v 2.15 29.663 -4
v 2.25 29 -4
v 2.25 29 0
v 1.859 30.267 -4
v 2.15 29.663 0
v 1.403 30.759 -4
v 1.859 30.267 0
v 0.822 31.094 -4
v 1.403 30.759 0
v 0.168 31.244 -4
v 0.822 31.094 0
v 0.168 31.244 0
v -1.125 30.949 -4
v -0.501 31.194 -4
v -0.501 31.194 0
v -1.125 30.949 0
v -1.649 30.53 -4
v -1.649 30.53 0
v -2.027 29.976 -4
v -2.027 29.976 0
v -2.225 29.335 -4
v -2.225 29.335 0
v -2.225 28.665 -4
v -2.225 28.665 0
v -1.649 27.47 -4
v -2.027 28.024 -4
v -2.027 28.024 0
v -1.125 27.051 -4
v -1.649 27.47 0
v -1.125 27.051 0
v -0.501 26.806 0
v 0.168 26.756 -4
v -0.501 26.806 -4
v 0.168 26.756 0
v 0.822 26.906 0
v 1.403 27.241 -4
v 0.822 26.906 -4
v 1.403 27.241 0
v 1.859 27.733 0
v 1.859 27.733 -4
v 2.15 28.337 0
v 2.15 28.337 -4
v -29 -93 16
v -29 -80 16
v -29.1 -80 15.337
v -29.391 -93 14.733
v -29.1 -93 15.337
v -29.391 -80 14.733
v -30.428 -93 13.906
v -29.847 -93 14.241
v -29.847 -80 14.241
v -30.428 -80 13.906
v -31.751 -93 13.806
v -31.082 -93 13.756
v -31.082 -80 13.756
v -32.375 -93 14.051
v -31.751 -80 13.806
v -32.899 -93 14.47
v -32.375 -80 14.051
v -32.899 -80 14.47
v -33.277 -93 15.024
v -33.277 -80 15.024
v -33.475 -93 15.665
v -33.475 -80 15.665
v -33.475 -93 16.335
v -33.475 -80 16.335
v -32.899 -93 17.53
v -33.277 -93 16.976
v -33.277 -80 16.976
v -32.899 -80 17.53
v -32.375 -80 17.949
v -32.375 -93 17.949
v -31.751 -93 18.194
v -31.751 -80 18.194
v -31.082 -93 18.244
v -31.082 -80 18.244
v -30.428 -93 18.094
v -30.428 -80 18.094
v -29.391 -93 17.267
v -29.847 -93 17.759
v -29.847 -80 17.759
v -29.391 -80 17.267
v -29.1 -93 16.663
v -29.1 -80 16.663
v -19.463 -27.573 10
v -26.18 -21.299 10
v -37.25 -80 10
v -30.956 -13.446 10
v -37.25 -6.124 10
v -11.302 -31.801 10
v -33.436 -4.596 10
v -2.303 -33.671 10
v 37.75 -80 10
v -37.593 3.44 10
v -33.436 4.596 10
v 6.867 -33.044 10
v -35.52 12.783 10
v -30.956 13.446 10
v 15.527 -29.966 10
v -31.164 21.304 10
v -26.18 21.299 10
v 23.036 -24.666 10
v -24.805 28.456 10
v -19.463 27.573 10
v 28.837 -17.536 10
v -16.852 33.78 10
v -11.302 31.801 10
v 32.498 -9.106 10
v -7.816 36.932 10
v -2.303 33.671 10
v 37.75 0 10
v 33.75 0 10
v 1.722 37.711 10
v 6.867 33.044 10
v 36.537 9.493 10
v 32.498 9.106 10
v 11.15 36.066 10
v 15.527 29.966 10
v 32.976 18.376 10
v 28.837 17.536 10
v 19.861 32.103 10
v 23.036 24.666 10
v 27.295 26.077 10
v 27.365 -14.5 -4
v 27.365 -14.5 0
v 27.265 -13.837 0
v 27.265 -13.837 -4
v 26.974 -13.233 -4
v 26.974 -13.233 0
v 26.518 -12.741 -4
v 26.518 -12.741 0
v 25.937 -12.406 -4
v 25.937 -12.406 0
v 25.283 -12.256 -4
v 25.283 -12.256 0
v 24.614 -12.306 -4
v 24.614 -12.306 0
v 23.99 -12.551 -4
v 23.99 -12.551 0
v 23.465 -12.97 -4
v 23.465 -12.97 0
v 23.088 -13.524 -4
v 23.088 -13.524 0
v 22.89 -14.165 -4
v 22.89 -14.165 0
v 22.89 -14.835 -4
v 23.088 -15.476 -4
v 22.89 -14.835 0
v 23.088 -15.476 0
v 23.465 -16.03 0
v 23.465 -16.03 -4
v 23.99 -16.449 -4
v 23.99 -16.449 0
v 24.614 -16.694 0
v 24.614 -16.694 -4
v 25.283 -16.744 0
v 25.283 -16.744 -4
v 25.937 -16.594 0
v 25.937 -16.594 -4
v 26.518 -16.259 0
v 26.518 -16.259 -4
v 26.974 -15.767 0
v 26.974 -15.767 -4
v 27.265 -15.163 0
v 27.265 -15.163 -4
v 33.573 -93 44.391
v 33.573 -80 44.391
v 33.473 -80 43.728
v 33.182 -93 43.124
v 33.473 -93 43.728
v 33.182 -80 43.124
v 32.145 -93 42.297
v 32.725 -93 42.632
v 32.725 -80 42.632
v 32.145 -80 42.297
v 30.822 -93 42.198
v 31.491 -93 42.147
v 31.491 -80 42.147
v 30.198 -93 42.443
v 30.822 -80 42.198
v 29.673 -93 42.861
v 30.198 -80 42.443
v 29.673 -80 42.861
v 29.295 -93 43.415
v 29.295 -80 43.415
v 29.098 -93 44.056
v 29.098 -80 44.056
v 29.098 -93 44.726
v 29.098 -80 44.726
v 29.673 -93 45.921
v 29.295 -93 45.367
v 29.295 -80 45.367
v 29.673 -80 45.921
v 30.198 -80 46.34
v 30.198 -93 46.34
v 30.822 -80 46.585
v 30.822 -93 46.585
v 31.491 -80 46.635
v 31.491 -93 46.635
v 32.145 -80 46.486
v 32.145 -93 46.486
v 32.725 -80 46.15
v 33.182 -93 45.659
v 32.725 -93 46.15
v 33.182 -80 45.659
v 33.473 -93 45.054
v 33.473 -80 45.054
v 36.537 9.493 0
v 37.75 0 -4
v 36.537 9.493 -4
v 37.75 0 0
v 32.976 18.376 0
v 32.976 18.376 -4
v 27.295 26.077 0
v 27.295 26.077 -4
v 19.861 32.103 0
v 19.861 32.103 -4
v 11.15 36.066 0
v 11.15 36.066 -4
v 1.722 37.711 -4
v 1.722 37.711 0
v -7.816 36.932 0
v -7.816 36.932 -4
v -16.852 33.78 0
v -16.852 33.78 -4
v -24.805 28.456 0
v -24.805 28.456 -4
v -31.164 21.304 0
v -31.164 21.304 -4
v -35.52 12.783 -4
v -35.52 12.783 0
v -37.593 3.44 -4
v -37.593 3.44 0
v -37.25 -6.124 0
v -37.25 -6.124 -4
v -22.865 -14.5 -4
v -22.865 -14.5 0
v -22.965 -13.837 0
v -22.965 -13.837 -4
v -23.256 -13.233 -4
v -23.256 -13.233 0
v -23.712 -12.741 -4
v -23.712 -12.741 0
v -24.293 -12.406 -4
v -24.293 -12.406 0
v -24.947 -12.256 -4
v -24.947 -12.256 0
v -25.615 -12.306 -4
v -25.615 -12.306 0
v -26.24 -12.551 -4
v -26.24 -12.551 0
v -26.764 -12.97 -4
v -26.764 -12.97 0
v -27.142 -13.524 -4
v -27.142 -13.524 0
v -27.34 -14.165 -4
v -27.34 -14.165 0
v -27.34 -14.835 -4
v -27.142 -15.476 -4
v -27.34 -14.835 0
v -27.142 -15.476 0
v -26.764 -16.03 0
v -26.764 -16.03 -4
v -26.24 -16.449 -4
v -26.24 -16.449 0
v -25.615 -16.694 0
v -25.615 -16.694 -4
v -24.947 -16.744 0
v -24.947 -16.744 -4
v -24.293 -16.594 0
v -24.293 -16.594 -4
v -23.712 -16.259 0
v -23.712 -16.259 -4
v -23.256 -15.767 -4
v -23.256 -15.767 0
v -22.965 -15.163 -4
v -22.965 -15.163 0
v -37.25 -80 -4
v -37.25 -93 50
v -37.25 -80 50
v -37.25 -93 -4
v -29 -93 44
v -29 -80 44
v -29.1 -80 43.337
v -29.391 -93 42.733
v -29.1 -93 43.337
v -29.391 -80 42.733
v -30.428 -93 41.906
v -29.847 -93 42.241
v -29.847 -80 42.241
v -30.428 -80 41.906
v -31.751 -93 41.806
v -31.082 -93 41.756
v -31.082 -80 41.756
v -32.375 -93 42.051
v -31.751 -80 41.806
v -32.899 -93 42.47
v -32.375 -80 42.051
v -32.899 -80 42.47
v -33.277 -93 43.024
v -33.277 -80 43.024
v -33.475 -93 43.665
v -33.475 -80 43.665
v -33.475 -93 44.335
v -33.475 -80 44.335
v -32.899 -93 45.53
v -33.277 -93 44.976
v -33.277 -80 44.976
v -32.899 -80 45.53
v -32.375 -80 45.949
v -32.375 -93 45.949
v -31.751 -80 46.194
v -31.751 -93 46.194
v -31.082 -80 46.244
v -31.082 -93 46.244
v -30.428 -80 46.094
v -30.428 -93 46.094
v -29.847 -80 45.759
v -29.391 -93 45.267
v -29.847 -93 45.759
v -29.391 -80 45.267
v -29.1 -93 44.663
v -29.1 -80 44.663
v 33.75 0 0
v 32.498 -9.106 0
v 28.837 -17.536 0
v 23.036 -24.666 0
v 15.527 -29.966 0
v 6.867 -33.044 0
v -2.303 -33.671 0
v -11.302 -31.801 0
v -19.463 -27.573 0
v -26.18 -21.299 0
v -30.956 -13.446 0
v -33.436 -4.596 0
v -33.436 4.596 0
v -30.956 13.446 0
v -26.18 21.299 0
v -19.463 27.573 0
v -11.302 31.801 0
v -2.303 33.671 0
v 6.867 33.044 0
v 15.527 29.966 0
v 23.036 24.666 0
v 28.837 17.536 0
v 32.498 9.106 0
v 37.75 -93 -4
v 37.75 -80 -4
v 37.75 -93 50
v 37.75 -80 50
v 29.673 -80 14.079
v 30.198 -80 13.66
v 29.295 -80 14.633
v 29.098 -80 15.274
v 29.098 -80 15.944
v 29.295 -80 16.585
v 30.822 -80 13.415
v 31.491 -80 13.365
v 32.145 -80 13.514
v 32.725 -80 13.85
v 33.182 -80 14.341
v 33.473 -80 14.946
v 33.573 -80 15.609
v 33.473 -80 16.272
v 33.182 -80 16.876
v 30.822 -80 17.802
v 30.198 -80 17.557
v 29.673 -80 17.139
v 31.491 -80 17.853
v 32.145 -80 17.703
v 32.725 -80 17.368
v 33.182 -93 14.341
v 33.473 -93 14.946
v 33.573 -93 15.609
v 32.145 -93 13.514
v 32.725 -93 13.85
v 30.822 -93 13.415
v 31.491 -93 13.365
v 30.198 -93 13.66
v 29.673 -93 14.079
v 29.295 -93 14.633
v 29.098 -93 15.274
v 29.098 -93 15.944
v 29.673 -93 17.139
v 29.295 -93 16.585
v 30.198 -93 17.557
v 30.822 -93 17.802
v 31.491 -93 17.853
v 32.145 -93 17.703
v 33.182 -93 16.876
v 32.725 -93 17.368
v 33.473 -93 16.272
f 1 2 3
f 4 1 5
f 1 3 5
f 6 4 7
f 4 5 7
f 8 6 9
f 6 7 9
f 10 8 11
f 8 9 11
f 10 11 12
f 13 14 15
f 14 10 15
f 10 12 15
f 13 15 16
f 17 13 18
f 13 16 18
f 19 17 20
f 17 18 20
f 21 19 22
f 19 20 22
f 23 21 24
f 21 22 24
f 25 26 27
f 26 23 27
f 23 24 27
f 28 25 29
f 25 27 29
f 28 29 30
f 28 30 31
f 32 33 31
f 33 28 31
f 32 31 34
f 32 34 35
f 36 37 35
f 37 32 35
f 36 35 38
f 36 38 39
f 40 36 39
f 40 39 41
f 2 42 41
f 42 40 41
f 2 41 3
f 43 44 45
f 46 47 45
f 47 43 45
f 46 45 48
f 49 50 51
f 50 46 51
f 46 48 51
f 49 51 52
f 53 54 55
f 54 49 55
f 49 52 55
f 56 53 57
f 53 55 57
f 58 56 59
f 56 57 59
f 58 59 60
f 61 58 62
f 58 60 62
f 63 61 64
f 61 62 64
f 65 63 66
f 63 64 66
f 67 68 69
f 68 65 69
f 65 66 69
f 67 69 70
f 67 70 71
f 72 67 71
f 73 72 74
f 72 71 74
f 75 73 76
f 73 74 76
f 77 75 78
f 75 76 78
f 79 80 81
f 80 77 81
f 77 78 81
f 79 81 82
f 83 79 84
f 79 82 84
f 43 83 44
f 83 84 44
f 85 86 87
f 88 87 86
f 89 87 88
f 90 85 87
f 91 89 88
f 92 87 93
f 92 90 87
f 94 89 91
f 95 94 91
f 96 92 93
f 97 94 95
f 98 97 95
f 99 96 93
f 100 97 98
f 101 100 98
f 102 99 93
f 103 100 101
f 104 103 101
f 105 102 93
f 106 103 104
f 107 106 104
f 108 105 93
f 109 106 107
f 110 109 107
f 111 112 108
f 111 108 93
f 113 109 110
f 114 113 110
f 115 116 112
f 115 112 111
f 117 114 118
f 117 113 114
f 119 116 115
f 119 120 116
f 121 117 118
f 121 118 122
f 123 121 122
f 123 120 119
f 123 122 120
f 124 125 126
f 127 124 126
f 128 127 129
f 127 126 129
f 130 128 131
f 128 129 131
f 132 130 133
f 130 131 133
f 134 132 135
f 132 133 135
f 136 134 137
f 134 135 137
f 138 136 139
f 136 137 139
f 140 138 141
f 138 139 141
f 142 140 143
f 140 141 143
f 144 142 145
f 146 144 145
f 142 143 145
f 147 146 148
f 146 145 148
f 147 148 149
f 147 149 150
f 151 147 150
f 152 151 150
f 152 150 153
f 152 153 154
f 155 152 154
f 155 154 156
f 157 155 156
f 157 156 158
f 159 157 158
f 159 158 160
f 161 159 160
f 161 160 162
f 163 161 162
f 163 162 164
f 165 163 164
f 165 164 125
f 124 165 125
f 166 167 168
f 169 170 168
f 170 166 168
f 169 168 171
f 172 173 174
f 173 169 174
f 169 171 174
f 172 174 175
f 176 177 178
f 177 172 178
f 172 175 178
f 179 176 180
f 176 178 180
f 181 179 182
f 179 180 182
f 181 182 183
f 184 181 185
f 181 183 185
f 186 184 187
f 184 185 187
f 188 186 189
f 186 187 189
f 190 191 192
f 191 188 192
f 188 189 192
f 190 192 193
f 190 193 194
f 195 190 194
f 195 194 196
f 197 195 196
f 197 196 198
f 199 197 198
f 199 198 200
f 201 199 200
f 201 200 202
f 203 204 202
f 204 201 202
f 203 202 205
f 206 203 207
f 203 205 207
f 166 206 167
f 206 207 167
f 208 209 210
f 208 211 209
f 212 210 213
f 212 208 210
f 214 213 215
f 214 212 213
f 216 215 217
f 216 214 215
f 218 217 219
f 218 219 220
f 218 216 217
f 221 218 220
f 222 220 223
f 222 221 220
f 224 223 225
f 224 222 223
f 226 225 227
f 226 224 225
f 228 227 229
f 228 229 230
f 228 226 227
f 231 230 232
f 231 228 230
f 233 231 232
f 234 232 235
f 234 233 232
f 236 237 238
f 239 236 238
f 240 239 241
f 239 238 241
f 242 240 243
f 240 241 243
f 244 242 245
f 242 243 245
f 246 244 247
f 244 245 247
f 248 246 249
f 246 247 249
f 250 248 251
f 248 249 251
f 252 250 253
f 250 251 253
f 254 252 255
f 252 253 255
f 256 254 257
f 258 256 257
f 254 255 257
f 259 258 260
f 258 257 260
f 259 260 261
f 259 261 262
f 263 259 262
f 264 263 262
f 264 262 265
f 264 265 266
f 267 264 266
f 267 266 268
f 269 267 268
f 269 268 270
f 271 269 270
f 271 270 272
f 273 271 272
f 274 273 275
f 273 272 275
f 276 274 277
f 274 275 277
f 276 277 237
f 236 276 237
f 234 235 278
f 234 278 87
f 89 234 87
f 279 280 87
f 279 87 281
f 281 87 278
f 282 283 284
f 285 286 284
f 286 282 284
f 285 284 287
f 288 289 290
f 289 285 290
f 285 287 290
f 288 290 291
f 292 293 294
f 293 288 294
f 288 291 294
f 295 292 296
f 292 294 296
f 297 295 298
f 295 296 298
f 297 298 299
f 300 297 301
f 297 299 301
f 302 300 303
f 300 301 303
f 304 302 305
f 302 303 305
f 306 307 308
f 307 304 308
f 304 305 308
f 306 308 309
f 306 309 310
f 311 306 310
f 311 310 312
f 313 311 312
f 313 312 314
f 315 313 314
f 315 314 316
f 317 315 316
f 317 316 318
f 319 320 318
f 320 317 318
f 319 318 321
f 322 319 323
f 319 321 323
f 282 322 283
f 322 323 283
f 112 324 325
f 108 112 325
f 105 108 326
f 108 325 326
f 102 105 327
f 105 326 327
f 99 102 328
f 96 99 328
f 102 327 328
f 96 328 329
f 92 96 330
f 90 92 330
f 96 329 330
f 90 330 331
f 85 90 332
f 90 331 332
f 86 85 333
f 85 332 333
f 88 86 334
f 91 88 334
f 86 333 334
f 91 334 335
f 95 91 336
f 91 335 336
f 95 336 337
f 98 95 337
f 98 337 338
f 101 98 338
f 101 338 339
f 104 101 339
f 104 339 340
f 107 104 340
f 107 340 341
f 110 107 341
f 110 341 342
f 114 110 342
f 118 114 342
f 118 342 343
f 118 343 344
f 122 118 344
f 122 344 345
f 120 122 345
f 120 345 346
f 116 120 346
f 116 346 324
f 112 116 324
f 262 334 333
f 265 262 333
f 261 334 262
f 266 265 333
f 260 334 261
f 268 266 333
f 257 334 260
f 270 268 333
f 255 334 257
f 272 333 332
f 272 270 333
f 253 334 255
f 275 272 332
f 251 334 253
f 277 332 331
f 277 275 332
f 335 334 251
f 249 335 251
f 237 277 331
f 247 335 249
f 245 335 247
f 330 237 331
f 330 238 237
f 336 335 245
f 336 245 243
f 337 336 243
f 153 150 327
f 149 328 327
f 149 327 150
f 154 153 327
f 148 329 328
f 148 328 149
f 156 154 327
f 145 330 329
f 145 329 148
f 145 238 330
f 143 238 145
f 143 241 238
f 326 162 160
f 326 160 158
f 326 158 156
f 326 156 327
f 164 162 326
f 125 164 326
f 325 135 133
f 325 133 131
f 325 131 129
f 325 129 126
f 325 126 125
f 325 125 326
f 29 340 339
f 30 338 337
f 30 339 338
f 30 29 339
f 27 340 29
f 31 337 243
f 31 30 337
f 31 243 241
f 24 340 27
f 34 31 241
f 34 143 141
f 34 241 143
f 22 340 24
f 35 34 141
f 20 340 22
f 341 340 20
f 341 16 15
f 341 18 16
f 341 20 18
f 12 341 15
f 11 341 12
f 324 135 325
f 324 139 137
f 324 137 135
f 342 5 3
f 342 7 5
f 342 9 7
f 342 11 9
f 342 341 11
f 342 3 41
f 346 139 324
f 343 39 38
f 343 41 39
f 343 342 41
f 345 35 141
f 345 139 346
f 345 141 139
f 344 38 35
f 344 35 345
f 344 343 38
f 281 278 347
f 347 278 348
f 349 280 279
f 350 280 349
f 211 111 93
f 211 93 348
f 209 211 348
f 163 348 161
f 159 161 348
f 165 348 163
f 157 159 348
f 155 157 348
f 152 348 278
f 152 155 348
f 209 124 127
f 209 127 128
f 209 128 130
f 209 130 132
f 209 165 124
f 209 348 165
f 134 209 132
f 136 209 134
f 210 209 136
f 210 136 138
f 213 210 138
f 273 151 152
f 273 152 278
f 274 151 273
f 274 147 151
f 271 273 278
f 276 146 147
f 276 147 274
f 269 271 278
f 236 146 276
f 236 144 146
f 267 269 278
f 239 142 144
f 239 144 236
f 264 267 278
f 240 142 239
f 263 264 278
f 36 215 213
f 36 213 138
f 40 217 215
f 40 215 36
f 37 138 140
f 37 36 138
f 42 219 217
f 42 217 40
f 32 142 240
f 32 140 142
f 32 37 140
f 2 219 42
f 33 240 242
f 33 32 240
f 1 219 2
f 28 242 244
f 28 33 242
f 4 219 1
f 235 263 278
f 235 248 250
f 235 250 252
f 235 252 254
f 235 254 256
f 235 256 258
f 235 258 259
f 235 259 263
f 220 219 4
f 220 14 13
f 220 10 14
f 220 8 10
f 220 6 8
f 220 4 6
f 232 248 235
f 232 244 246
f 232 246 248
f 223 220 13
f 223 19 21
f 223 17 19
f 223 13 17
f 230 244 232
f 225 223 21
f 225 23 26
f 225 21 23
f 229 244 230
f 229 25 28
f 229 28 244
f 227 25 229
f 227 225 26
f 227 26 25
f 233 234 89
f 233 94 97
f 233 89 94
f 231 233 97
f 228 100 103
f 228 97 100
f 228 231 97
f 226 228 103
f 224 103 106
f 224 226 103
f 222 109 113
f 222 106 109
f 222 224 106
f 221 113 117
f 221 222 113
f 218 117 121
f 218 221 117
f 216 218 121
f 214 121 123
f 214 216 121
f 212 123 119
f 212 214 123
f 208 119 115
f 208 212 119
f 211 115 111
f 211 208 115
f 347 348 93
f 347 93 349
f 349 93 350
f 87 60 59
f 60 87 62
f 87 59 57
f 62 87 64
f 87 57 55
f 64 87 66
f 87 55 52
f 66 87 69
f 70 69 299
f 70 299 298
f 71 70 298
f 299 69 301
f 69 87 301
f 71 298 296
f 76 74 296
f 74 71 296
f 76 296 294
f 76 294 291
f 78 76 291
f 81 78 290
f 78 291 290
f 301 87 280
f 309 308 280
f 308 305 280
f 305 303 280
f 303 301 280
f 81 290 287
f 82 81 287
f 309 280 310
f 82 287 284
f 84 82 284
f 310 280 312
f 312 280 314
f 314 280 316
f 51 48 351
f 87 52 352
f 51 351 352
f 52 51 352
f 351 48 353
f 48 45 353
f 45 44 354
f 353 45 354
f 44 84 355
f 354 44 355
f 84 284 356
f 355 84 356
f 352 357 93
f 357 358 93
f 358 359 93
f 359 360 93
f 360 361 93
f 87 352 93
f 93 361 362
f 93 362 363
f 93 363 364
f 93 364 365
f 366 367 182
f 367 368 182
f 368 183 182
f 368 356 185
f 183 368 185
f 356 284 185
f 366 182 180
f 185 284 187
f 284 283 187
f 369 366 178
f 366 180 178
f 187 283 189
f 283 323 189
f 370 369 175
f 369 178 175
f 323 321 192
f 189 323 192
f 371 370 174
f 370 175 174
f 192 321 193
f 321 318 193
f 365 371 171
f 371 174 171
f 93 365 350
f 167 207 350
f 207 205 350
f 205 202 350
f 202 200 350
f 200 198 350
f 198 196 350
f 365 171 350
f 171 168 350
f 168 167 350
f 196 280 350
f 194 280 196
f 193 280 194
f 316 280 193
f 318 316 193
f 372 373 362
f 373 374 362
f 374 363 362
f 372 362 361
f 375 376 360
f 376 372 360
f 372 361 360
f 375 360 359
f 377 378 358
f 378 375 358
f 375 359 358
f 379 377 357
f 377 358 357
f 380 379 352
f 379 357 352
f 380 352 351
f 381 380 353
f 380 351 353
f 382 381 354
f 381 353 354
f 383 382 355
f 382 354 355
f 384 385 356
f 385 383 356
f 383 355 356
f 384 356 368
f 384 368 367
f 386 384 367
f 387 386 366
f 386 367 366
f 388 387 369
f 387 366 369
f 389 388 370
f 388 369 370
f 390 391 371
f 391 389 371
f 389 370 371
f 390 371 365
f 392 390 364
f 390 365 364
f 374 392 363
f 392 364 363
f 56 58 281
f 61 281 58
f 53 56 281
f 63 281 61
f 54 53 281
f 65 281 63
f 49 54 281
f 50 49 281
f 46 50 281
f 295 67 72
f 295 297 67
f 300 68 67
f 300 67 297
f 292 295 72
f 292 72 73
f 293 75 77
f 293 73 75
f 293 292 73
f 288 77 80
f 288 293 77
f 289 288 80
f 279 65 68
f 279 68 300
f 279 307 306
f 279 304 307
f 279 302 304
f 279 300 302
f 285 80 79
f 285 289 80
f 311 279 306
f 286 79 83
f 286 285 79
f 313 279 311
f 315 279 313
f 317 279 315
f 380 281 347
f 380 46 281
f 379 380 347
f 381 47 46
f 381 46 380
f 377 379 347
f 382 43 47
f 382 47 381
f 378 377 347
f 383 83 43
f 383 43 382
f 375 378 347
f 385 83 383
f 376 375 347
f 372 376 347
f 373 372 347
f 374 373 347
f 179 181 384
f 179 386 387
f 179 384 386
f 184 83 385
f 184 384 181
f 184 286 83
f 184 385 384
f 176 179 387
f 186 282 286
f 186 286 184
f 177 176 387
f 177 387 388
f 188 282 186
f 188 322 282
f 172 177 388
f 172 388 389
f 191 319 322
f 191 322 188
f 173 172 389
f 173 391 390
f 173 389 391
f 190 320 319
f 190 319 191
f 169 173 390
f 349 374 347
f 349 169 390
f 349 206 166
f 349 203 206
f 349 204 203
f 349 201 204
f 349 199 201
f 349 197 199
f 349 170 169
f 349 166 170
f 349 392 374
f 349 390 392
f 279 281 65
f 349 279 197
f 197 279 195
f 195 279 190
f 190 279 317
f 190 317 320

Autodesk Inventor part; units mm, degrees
ref_plane "YZ Plane" through (0, 0, 0) normal (1, 0, 0) x (0, 1, 0)
ref_plane "XZ Plane" through (0, 0, 0) normal (0, 1, 0) x (-1, 0, 0)
ref_plane "XY Plane" through (0, 0, 0) normal (0, 0, 1) x (1, 0, 0)
sketch "草图1" plane through (0, 0, 0) normal (0, 0, 1) x (1, 0, 0)
  circle A0 centre (0, 0) radius 33.75
  circle A1 centre (0, 0) radius 29
  circle A2 centre (0, 29) radius 2.25
  circle A3 centre (-25.1147, -14.5) radius 2.25
  circle A4 centre (25.1147, -14.5) radius 2.25
  circle A5 centre (0, 0) radius 37.75
  circle A6 centre (0, 0) radius 23.5
  dimension "d1" = 58
  dimension "d0" = 67.5
  dimension "d2" = 4.5
  dimension "d5" = 360
  dimension "d7" = 4
  dimension "d13" = 47
sketch "草图2" plane through (0, 0, 0) normal (0, 1, 0) x (-1, 0, 0)
  line L0 (37.75, 0) -> (-37.75, 0) projected
  line L1 (-37.75, 0) -> (37.25, 0)
  line L2 (37.25, 0) -> (37.25, 10)
  line L3 (37.25, 10) -> (-37.75, 10)
  line L4 (-37.75, 10) -> (-37.75, 0)
  line L5 (37.25, 0) -> (-37.75, 0)
  line L6 (-37.75, 0) -> (-37.75, -4)
  line L7 (-37.75, -4) -> (37.25, -4)
  line L8 (37.25, -4) -> (37.25, 0)
  point P0 (0, 0)
  dimension "d8" = 75
  dimension "d9" = 10
  dimension "d12" = 4
extrude "拉伸1" add sketch "草图2" against normal blind 80
extrude "拉伸2" cut sketch "草图1" along normal blind 10 contours A0 | A1 A4 A3 A2 | A2 A1 | A1 A2 | A4 A1 | A1 A4 | A3 A1 | A1 A3 | A6
extrude "拉伸3" cut sketch "草图1" against normal blind 10 contours A2 A1 | A1 A2 | A4 A1 | A1 A4 | A3 A1 | A1 A3
extrude "拉伸4" add sketch "草图1" against normal blind 4 contours A0 | A1 A4 A3 A2 | A5 | A6
extrude "拉伸5" add sketch "草图1" along normal blind 10 contours A5
sketch "草图3" plane through (0, -80, 0) normal (0, -1, 0) x (1, 0, 0)
  line L0 (-37.25, 10) -> (-37.25, -4) projected
  line L1 (-37.25, -4) -> (37.75, -4) projected
  line L2 (37.75, -4) -> (37.75, 10) projected
  line L3 (37.75, 10) -> (-37.25, 10) projected
  line L4 (37.75, 0) -> (-37.25, 0)
  line L5 (-37.25, 0) -> (-37.25, 50)
  line L6 (-37.25, 50) -> (37.75, 50)
  line L7 (37.75, 50) -> (37.75, 0)
  line L8 (37.75, -4) -> (-37.25, -4)
  line L9 (-37.25, -4) -> (-37.25, 0)
  line L10 (-37.25, 0) -> (37.75, 0)
  line L11 (37.75, 0) -> (37.75, -4)
  circle A0 centre (-31.25, 44) radius 2.25
  line L12 (0.25, 10) -> (0, 50)
  circle A1 centre (31.3226, 44.3911) radius 2.25
  line L13 (-37.25, 30) -> (37.75, 30)
  circle A2 centre (-31.25, 16) radius 2.25
  circle A3 centre (31.3226, 15.6089) radius 2.25
  point P0 (0, 0)
  dimension "d22" = 50
  dimension "d25" = 4.5
  dimension "d26" = 6
  dimension "d27" = 6
extrude "拉伸6" add sketch "草图3" along normal blind 13
properties part number "电机支架-v0.1.0"
